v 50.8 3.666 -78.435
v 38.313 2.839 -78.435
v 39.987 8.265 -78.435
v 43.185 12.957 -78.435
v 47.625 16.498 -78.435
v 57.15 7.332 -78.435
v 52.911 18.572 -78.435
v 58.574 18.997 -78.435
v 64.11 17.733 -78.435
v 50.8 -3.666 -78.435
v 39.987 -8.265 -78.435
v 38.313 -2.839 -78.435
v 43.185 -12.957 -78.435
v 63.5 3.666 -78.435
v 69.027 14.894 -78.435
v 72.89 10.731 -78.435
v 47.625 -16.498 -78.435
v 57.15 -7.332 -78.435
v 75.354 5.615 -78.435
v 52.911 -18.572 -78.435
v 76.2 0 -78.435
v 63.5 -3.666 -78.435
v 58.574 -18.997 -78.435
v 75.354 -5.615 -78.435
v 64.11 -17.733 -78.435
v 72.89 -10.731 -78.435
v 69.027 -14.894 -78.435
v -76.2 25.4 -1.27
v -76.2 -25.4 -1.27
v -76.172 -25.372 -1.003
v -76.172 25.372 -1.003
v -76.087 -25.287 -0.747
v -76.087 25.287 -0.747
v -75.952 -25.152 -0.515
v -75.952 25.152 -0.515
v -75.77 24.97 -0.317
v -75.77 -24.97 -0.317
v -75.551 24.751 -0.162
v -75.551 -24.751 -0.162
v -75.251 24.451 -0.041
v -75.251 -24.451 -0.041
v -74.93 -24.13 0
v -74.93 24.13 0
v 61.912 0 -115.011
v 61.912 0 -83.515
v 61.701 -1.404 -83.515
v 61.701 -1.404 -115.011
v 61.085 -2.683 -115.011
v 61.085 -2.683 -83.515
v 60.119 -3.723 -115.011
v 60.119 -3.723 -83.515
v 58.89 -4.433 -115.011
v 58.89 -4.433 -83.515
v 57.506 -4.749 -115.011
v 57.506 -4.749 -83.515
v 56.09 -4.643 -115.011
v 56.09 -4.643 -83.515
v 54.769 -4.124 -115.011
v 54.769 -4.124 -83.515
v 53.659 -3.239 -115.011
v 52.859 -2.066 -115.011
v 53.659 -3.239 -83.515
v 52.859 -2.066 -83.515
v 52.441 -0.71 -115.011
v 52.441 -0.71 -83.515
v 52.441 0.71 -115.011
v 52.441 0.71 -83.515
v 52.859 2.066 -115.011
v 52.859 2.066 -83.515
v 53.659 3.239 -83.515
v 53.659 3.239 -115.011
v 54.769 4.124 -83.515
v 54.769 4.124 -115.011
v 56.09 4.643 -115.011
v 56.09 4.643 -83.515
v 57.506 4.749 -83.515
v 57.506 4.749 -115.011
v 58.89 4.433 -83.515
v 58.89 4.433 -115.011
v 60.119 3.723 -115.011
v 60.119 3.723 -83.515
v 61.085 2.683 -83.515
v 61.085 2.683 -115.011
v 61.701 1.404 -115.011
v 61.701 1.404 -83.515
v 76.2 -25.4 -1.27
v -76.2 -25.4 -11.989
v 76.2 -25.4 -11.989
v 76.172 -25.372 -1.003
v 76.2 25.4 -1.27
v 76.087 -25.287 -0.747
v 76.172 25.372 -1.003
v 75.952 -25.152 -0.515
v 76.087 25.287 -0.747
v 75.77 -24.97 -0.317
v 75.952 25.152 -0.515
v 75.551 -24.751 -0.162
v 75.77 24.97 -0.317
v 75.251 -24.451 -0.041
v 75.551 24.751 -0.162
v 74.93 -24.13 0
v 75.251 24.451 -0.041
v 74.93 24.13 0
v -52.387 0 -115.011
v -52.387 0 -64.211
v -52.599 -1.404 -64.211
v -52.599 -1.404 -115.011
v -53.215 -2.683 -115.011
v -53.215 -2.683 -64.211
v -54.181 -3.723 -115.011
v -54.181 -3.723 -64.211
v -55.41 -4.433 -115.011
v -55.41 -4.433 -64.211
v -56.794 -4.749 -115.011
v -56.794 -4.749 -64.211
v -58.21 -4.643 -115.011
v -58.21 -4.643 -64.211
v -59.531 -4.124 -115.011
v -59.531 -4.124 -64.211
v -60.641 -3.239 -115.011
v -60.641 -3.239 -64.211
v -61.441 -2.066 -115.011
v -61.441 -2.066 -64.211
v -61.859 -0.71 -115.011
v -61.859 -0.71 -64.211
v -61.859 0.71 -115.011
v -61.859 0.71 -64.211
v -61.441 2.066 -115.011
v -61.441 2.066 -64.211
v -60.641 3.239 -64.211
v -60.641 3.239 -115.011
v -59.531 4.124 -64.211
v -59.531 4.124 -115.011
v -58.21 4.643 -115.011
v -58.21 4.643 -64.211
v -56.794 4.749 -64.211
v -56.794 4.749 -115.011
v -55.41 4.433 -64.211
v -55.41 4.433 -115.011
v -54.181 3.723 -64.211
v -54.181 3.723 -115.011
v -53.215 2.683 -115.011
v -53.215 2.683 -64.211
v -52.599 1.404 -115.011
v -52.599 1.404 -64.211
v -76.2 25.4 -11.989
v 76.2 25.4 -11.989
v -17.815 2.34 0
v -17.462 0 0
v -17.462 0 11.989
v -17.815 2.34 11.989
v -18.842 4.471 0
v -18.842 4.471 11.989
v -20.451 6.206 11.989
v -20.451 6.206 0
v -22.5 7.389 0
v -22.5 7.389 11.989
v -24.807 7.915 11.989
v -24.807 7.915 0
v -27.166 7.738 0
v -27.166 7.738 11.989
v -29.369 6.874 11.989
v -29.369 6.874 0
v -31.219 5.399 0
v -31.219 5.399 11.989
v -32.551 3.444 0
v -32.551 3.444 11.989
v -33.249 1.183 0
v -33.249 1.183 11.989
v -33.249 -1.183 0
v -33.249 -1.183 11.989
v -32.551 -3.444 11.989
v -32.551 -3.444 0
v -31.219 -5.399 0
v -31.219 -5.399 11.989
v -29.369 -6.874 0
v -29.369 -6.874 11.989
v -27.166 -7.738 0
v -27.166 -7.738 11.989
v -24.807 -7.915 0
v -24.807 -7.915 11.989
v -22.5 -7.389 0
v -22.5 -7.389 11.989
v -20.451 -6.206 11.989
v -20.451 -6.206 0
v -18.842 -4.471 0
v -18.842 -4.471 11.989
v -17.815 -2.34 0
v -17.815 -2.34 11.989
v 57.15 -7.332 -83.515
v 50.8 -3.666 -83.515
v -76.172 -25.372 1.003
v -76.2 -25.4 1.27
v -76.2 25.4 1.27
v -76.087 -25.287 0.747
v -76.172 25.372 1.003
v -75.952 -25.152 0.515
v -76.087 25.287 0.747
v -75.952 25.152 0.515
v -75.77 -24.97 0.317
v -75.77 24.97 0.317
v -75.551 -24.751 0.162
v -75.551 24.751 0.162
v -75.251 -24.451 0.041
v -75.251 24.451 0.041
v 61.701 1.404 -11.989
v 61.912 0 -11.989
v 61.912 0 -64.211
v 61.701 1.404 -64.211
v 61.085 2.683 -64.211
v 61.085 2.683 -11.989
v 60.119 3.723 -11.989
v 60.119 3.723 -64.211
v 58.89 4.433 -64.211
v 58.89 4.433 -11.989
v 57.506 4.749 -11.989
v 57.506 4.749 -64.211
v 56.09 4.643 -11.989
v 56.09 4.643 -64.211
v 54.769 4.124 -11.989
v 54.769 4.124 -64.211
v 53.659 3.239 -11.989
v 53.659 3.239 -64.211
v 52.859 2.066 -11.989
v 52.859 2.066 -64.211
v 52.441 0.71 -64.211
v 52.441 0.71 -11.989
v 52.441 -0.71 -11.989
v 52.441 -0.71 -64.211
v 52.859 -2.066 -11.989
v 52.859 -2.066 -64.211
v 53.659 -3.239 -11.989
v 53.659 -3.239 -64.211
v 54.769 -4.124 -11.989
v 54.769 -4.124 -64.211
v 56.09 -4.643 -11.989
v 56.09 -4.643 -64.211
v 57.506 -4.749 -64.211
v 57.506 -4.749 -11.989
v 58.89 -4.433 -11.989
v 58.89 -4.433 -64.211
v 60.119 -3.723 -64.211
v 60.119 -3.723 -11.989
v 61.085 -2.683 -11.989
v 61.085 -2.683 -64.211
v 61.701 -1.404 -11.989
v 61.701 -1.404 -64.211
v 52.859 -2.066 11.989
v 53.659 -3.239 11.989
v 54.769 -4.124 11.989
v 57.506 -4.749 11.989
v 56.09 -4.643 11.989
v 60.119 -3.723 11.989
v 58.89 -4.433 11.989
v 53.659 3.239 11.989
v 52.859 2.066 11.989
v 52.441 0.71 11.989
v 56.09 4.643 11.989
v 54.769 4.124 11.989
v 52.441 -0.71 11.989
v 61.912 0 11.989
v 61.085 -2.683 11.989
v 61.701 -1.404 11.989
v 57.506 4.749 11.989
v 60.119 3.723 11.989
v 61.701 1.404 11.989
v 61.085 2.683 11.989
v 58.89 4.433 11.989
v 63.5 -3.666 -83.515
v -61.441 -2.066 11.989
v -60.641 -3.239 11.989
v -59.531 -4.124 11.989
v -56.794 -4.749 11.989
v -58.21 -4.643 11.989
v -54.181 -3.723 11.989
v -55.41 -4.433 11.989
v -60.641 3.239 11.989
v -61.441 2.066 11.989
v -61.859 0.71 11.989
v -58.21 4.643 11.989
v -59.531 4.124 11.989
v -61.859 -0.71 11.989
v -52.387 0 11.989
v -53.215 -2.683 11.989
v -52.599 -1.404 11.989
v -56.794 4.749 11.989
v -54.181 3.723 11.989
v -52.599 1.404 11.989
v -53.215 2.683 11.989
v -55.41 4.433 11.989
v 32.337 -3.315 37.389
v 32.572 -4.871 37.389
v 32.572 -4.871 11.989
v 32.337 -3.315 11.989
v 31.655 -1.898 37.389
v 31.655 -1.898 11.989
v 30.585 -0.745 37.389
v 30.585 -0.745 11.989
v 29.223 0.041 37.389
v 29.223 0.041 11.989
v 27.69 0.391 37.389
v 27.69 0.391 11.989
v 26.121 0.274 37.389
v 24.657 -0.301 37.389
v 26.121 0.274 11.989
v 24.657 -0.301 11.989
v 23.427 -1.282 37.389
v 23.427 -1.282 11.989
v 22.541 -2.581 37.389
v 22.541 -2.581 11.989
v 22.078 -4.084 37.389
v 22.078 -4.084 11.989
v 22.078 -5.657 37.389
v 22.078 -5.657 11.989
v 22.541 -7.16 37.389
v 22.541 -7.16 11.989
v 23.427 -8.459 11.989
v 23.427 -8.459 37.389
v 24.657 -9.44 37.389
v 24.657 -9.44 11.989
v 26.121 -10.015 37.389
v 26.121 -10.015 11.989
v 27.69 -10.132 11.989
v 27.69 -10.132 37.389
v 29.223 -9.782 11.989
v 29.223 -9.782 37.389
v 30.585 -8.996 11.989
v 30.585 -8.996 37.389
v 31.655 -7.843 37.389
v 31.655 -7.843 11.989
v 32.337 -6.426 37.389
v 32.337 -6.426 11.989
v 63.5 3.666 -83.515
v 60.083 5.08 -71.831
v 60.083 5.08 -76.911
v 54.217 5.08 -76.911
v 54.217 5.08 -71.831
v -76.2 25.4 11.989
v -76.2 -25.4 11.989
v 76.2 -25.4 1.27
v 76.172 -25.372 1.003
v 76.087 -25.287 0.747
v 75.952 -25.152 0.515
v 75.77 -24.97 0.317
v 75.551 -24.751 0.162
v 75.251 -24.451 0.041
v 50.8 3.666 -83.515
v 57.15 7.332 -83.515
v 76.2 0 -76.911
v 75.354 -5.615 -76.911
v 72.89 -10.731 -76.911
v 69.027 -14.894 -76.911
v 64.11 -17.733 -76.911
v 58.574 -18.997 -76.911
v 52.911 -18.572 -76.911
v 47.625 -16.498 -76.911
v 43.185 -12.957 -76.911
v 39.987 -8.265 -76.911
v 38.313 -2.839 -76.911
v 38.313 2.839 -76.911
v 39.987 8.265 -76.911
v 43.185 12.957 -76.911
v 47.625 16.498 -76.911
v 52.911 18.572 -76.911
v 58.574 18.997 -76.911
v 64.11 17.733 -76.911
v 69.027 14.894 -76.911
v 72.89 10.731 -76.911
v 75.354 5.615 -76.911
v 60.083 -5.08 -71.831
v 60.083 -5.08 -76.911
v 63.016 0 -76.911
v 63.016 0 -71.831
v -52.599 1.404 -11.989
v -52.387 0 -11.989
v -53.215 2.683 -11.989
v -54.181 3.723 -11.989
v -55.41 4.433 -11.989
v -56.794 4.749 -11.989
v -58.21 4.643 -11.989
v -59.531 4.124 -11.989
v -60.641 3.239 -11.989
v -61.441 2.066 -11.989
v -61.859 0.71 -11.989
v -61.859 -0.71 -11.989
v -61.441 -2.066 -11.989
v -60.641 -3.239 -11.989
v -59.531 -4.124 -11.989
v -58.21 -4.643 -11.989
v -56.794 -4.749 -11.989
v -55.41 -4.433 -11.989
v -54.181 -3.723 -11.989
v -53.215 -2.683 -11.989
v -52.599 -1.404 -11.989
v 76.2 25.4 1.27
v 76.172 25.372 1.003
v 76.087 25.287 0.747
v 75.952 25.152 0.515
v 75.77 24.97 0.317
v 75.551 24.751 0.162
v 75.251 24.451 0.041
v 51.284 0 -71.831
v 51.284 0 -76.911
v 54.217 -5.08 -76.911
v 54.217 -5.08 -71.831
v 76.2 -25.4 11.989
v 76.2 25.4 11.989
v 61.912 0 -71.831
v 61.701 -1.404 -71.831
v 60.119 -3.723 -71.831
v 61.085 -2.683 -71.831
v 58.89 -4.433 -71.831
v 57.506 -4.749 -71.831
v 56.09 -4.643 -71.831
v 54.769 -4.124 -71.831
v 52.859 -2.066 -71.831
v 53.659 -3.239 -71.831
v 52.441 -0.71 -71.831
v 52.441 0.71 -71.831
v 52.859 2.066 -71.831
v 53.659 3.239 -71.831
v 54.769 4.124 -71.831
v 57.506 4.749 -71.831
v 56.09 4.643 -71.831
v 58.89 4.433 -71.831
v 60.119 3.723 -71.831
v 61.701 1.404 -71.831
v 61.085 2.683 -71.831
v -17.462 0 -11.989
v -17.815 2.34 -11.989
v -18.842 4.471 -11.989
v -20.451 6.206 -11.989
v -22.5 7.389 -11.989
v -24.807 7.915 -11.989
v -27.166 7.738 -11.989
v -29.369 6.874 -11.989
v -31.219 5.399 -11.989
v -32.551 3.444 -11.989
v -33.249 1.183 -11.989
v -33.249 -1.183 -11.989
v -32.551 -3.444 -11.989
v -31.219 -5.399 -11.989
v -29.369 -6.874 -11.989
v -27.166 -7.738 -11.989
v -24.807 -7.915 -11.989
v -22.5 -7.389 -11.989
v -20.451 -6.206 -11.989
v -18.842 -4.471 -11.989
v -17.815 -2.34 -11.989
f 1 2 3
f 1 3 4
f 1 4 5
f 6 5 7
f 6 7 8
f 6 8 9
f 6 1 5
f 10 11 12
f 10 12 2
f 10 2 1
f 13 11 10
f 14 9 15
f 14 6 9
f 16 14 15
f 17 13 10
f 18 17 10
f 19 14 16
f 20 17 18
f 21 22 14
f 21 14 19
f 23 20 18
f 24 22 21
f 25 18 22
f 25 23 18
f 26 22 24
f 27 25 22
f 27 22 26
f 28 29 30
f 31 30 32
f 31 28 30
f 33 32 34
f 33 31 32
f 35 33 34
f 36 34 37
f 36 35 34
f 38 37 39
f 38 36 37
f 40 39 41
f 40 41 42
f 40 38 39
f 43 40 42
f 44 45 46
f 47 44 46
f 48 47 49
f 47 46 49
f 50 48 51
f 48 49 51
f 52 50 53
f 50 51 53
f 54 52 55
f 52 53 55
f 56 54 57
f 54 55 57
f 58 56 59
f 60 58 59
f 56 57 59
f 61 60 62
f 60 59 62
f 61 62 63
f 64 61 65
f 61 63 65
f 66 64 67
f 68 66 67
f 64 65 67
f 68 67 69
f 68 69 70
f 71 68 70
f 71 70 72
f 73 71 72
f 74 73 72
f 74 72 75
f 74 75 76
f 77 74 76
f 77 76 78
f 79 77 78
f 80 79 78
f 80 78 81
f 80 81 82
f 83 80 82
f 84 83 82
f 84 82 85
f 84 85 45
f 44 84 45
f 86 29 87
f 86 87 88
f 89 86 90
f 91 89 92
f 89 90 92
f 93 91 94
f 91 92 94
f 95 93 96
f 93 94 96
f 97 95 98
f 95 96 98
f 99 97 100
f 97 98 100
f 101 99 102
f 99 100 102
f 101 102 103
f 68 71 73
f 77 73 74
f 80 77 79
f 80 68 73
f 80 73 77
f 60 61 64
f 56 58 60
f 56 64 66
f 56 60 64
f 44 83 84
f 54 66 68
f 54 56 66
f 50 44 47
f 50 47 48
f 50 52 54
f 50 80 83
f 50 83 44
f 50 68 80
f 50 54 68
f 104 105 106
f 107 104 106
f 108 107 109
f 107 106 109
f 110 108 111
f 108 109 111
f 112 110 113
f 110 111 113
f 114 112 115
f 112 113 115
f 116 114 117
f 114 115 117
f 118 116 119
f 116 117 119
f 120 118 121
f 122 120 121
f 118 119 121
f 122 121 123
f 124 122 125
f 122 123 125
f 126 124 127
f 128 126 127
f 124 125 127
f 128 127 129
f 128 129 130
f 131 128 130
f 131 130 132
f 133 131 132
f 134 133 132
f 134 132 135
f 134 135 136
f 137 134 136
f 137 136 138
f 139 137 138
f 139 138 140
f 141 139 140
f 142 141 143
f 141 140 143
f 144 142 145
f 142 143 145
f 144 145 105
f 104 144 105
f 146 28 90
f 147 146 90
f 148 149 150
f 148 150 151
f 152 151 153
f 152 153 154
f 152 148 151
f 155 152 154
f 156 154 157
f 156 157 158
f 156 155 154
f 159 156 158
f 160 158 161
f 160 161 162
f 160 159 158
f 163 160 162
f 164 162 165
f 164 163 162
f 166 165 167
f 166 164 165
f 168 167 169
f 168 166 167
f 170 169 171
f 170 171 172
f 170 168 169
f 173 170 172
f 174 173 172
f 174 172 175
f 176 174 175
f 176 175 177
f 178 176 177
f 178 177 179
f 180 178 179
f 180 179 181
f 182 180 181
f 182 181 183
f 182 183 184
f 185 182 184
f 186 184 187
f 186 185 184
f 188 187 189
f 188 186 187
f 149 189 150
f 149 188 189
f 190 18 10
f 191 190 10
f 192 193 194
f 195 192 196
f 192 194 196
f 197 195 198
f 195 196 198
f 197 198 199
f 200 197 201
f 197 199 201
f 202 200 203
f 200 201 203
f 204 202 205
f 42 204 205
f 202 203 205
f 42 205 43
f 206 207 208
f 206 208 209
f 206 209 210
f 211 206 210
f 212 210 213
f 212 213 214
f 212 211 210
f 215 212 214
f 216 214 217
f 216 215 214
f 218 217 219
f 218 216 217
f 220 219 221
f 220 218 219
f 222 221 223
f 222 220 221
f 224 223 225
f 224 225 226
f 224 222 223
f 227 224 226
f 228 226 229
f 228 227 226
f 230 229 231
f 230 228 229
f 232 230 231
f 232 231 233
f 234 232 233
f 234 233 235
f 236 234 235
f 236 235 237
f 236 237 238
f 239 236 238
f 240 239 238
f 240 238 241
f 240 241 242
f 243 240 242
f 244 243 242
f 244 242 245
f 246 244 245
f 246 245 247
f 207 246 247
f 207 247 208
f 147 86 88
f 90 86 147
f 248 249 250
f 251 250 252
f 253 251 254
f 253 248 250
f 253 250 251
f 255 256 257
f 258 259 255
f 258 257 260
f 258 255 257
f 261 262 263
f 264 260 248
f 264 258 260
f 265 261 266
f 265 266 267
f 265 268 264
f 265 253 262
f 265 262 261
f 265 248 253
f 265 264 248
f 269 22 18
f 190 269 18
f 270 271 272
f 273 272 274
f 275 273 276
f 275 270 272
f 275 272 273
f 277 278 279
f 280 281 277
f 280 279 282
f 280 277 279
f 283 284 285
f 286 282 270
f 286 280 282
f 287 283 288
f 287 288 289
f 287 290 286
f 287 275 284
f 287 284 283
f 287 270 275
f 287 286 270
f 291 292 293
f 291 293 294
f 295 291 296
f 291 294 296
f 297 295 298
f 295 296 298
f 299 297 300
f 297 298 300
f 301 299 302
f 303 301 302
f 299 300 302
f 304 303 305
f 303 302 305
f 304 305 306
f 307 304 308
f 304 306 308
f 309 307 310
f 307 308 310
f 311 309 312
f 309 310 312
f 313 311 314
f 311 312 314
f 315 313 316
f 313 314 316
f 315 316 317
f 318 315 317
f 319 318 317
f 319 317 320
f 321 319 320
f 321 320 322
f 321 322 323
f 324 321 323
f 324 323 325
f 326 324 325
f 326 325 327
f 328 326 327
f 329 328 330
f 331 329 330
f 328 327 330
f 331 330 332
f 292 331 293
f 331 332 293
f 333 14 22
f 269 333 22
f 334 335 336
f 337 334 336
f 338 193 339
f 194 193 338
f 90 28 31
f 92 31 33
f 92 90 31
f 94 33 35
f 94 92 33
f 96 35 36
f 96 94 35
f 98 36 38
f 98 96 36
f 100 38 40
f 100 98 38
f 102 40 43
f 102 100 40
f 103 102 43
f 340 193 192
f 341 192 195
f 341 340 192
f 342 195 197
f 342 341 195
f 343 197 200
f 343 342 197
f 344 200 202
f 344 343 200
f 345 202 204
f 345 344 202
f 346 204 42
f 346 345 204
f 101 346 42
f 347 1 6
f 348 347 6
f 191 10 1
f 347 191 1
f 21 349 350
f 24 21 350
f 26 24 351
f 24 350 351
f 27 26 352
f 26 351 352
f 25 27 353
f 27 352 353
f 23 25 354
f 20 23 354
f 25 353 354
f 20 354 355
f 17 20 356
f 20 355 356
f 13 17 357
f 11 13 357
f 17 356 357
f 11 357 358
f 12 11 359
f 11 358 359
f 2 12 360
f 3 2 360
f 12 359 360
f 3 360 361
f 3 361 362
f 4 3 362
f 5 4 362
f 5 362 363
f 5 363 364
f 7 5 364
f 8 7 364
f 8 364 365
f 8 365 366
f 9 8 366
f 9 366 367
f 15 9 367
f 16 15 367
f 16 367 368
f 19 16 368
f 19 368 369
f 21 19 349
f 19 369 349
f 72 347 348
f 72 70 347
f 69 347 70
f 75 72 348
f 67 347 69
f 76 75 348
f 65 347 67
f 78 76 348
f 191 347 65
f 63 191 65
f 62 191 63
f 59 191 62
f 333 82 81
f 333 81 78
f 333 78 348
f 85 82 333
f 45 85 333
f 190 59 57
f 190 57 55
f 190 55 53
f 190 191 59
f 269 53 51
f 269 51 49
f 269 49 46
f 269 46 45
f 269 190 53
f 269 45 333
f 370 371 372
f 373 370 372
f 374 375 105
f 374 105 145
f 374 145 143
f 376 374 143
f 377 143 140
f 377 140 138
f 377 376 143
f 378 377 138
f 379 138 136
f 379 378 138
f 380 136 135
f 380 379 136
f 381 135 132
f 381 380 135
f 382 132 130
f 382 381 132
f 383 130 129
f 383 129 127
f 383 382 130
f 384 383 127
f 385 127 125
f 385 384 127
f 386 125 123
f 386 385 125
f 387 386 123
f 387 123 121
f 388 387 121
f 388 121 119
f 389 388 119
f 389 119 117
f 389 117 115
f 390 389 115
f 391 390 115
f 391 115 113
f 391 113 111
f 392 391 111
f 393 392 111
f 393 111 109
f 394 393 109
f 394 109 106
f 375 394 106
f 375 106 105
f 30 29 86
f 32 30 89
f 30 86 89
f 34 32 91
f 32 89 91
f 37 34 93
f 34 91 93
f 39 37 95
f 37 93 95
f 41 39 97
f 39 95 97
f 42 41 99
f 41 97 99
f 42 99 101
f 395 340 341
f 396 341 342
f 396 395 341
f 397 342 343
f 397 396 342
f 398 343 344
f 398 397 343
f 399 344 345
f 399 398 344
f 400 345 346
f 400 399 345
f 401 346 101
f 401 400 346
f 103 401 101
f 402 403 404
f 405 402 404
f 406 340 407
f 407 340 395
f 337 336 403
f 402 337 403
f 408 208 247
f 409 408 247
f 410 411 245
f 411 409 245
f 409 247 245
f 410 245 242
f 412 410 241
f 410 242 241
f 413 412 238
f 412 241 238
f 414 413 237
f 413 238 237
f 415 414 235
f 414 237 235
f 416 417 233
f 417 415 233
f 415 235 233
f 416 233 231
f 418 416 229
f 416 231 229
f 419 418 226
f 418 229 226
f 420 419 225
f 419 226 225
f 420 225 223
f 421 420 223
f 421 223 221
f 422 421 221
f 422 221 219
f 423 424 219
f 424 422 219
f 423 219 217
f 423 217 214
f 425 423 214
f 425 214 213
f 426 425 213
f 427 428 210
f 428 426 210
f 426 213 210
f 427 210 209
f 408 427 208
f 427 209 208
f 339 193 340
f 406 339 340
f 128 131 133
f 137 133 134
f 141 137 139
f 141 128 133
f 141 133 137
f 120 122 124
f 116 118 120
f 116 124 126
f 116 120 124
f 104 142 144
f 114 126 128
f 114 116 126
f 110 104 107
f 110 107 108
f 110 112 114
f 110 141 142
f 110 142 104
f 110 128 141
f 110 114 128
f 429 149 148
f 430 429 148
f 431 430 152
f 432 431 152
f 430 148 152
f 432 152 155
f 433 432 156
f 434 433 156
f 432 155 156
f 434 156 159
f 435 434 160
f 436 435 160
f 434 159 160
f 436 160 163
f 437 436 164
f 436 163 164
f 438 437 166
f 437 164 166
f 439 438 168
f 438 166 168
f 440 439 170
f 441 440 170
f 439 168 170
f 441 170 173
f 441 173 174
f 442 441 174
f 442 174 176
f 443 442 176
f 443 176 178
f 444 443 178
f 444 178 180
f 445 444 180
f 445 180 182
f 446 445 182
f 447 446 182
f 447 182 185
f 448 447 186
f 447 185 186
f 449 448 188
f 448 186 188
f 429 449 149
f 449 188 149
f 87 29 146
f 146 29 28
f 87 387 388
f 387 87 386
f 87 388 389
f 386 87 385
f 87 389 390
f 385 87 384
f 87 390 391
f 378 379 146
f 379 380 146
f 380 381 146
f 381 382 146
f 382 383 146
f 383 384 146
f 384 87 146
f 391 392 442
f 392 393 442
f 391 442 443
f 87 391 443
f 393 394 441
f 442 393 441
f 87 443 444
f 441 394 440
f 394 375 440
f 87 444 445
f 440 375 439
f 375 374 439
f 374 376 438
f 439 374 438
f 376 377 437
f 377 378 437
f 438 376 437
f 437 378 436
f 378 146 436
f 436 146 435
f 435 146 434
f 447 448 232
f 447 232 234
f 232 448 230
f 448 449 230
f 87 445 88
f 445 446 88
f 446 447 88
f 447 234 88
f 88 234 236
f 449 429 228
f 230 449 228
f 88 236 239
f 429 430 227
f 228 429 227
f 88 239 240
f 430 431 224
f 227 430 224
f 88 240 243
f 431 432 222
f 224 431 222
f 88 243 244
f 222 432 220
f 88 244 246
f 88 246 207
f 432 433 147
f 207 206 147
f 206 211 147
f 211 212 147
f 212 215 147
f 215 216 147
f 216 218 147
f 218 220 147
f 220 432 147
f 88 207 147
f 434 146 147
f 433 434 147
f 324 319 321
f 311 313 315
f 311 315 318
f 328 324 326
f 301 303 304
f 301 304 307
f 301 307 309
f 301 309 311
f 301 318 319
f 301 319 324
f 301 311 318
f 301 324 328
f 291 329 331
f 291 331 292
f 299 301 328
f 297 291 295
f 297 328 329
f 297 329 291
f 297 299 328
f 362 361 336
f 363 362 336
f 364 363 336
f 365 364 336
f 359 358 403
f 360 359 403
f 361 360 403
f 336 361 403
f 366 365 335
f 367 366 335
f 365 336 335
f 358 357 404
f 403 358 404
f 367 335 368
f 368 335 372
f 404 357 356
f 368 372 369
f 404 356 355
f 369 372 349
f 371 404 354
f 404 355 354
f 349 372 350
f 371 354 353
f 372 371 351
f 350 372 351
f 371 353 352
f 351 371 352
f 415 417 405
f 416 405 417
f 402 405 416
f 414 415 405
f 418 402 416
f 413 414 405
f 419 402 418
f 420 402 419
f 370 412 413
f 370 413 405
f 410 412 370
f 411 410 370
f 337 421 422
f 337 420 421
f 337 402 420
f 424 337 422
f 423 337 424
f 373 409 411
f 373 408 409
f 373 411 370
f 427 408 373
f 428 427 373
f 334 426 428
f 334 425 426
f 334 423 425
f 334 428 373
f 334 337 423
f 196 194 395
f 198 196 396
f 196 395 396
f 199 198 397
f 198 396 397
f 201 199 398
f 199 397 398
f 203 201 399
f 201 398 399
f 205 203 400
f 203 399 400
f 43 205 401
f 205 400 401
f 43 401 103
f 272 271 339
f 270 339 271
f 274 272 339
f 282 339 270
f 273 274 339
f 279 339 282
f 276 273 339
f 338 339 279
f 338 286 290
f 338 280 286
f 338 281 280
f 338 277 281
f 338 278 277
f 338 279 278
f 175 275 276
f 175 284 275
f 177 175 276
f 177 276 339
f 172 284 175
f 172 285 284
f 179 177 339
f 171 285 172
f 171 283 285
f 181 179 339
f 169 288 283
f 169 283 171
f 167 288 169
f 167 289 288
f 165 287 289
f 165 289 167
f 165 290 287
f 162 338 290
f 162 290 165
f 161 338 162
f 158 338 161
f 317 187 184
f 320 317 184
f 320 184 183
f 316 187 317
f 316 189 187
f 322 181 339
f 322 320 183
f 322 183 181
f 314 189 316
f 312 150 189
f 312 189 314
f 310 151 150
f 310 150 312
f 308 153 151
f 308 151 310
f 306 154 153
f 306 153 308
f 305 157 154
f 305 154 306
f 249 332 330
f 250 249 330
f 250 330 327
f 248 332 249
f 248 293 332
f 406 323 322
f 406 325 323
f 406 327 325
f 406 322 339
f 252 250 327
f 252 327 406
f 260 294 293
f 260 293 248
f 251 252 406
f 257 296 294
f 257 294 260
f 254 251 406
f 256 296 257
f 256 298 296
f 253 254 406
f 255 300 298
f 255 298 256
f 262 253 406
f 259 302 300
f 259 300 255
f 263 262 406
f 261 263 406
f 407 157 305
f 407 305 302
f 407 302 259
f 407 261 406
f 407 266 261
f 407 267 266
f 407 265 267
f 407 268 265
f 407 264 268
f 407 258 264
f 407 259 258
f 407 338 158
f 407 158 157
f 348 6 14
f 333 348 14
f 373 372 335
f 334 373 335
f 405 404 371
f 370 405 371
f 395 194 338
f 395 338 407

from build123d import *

# Parameters (mm, degrees)
F0_W      = 152.4
F0_H      = 50.8
F0_R      = 4.7625
F0_R_2    = 7.9375
F1_DEPTH  = 11.9888
F2_R      = 1.27
F4_R      = 4.7625
F5_DEPTH  = 76.2
F6_R      = 4.7625
F7_DEPTH  = 50.8
F9_R      = 19.05
F10_DEPTH = 1.524
F12_DEPTH = 5.08
F14_DEPTH = 5.08
F15_R     = 5.2764150672
F16_DEPTH = 25.4


with BuildPart() as f1:
    # F0 (on Top) → F1 (new body)
    with BuildSketch(Plane.XY):
        Rectangle(F0_W, F0_H)
        with Locations((-57.15, 0)):
            Circle(F0_R, mode=Mode.SUBTRACT)
        with Locations((-25.4, 0)):
            Circle(F0_R_2, mode=Mode.SUBTRACT)
        with Locations((57.15, 0)):
            Circle(F0_R, mode=Mode.SUBTRACT)
    extrude(amount=F1_DEPTH)

    # F2
    f2_edges = [f1.edges().sort_by_distance(p)[0] for p in [
        (0, 25.4, 0),
        (-76.2, 0, 0),
        (0, -25.4, 0),
        (76.2, 0, 0),
    ]]
    fillet(f2_edges, radius=F2_R)

    # F3: F1 across plane


with BuildPart() as f1_1:
    add(f1.part)
    add(f1.part.mirror(Plane.XY))

    # F4 (on face) → F5 (join)
    with BuildSketch(Plane.XY.offset(11.9888)):
        with Locations((-57.15, 0)):
            Circle(F4_R)
        with Locations((57.15, 0)):
            Circle(F4_R)
    extrude(amount=-F5_DEPTH)

    # F6 (on face) → F7 (join)
    with BuildSketch(Plane(origin=(0, 0, -64.2112), x_dir=(1, 0, 0), z_dir=(0, 0, -1))):
        with Locations((57.15, 0)):
            Circle(F6_R)
        with Locations((-57.15, 0)):
            Circle(F6_R)
    extrude(amount=F7_DEPTH)

    # F9 (on offset) → F10 (join)
    with BuildSketch(Plane(origin=(0, 0, -76.9112), x_dir=(1, 0, 0), z_dir=(0, 0, -1))):
        with Locations((57.15, 0)):
            Circle(F9_R)
    extrude(amount=F10_DEPTH)

    # F11 (on face) → F12 (join)
    with BuildSketch(Plane(origin=(0, 0, -78.4352), x_dir=(1, 0, 0), z_dir=(0, 0, -1))):
        Polygon((63.5, 3.6661742094), (57.15, 7.3323484187), (50.8, 3.6661742094), (50.8, -3.6661742094), (57.15, -7.3323484187), (63.5, -3.6661742094), align=None)
    extrude(amount=F12_DEPTH)

    # F13 (on face) → F14 (join)
    with BuildSketch(Plane.XY.offset(-76.9112)):
        Polygon((60.0829393675, -5.08), (63.015878735, 0), (60.0829393675, 5.08), (54.2170606325, 5.08), (51.284121265, 0), (54.2170606325, -5.08), align=None)
    extrude(amount=F14_DEPTH)

    # F15 (on face) → F16 (join)
    with BuildSketch(Plane.XY.offset(11.9888)):
        with Locations((27.2953044623, -4.8705367371)):
            Circle(F15_R)
    extrude(amount=F16_DEPTH)


solid = f1_1.part
